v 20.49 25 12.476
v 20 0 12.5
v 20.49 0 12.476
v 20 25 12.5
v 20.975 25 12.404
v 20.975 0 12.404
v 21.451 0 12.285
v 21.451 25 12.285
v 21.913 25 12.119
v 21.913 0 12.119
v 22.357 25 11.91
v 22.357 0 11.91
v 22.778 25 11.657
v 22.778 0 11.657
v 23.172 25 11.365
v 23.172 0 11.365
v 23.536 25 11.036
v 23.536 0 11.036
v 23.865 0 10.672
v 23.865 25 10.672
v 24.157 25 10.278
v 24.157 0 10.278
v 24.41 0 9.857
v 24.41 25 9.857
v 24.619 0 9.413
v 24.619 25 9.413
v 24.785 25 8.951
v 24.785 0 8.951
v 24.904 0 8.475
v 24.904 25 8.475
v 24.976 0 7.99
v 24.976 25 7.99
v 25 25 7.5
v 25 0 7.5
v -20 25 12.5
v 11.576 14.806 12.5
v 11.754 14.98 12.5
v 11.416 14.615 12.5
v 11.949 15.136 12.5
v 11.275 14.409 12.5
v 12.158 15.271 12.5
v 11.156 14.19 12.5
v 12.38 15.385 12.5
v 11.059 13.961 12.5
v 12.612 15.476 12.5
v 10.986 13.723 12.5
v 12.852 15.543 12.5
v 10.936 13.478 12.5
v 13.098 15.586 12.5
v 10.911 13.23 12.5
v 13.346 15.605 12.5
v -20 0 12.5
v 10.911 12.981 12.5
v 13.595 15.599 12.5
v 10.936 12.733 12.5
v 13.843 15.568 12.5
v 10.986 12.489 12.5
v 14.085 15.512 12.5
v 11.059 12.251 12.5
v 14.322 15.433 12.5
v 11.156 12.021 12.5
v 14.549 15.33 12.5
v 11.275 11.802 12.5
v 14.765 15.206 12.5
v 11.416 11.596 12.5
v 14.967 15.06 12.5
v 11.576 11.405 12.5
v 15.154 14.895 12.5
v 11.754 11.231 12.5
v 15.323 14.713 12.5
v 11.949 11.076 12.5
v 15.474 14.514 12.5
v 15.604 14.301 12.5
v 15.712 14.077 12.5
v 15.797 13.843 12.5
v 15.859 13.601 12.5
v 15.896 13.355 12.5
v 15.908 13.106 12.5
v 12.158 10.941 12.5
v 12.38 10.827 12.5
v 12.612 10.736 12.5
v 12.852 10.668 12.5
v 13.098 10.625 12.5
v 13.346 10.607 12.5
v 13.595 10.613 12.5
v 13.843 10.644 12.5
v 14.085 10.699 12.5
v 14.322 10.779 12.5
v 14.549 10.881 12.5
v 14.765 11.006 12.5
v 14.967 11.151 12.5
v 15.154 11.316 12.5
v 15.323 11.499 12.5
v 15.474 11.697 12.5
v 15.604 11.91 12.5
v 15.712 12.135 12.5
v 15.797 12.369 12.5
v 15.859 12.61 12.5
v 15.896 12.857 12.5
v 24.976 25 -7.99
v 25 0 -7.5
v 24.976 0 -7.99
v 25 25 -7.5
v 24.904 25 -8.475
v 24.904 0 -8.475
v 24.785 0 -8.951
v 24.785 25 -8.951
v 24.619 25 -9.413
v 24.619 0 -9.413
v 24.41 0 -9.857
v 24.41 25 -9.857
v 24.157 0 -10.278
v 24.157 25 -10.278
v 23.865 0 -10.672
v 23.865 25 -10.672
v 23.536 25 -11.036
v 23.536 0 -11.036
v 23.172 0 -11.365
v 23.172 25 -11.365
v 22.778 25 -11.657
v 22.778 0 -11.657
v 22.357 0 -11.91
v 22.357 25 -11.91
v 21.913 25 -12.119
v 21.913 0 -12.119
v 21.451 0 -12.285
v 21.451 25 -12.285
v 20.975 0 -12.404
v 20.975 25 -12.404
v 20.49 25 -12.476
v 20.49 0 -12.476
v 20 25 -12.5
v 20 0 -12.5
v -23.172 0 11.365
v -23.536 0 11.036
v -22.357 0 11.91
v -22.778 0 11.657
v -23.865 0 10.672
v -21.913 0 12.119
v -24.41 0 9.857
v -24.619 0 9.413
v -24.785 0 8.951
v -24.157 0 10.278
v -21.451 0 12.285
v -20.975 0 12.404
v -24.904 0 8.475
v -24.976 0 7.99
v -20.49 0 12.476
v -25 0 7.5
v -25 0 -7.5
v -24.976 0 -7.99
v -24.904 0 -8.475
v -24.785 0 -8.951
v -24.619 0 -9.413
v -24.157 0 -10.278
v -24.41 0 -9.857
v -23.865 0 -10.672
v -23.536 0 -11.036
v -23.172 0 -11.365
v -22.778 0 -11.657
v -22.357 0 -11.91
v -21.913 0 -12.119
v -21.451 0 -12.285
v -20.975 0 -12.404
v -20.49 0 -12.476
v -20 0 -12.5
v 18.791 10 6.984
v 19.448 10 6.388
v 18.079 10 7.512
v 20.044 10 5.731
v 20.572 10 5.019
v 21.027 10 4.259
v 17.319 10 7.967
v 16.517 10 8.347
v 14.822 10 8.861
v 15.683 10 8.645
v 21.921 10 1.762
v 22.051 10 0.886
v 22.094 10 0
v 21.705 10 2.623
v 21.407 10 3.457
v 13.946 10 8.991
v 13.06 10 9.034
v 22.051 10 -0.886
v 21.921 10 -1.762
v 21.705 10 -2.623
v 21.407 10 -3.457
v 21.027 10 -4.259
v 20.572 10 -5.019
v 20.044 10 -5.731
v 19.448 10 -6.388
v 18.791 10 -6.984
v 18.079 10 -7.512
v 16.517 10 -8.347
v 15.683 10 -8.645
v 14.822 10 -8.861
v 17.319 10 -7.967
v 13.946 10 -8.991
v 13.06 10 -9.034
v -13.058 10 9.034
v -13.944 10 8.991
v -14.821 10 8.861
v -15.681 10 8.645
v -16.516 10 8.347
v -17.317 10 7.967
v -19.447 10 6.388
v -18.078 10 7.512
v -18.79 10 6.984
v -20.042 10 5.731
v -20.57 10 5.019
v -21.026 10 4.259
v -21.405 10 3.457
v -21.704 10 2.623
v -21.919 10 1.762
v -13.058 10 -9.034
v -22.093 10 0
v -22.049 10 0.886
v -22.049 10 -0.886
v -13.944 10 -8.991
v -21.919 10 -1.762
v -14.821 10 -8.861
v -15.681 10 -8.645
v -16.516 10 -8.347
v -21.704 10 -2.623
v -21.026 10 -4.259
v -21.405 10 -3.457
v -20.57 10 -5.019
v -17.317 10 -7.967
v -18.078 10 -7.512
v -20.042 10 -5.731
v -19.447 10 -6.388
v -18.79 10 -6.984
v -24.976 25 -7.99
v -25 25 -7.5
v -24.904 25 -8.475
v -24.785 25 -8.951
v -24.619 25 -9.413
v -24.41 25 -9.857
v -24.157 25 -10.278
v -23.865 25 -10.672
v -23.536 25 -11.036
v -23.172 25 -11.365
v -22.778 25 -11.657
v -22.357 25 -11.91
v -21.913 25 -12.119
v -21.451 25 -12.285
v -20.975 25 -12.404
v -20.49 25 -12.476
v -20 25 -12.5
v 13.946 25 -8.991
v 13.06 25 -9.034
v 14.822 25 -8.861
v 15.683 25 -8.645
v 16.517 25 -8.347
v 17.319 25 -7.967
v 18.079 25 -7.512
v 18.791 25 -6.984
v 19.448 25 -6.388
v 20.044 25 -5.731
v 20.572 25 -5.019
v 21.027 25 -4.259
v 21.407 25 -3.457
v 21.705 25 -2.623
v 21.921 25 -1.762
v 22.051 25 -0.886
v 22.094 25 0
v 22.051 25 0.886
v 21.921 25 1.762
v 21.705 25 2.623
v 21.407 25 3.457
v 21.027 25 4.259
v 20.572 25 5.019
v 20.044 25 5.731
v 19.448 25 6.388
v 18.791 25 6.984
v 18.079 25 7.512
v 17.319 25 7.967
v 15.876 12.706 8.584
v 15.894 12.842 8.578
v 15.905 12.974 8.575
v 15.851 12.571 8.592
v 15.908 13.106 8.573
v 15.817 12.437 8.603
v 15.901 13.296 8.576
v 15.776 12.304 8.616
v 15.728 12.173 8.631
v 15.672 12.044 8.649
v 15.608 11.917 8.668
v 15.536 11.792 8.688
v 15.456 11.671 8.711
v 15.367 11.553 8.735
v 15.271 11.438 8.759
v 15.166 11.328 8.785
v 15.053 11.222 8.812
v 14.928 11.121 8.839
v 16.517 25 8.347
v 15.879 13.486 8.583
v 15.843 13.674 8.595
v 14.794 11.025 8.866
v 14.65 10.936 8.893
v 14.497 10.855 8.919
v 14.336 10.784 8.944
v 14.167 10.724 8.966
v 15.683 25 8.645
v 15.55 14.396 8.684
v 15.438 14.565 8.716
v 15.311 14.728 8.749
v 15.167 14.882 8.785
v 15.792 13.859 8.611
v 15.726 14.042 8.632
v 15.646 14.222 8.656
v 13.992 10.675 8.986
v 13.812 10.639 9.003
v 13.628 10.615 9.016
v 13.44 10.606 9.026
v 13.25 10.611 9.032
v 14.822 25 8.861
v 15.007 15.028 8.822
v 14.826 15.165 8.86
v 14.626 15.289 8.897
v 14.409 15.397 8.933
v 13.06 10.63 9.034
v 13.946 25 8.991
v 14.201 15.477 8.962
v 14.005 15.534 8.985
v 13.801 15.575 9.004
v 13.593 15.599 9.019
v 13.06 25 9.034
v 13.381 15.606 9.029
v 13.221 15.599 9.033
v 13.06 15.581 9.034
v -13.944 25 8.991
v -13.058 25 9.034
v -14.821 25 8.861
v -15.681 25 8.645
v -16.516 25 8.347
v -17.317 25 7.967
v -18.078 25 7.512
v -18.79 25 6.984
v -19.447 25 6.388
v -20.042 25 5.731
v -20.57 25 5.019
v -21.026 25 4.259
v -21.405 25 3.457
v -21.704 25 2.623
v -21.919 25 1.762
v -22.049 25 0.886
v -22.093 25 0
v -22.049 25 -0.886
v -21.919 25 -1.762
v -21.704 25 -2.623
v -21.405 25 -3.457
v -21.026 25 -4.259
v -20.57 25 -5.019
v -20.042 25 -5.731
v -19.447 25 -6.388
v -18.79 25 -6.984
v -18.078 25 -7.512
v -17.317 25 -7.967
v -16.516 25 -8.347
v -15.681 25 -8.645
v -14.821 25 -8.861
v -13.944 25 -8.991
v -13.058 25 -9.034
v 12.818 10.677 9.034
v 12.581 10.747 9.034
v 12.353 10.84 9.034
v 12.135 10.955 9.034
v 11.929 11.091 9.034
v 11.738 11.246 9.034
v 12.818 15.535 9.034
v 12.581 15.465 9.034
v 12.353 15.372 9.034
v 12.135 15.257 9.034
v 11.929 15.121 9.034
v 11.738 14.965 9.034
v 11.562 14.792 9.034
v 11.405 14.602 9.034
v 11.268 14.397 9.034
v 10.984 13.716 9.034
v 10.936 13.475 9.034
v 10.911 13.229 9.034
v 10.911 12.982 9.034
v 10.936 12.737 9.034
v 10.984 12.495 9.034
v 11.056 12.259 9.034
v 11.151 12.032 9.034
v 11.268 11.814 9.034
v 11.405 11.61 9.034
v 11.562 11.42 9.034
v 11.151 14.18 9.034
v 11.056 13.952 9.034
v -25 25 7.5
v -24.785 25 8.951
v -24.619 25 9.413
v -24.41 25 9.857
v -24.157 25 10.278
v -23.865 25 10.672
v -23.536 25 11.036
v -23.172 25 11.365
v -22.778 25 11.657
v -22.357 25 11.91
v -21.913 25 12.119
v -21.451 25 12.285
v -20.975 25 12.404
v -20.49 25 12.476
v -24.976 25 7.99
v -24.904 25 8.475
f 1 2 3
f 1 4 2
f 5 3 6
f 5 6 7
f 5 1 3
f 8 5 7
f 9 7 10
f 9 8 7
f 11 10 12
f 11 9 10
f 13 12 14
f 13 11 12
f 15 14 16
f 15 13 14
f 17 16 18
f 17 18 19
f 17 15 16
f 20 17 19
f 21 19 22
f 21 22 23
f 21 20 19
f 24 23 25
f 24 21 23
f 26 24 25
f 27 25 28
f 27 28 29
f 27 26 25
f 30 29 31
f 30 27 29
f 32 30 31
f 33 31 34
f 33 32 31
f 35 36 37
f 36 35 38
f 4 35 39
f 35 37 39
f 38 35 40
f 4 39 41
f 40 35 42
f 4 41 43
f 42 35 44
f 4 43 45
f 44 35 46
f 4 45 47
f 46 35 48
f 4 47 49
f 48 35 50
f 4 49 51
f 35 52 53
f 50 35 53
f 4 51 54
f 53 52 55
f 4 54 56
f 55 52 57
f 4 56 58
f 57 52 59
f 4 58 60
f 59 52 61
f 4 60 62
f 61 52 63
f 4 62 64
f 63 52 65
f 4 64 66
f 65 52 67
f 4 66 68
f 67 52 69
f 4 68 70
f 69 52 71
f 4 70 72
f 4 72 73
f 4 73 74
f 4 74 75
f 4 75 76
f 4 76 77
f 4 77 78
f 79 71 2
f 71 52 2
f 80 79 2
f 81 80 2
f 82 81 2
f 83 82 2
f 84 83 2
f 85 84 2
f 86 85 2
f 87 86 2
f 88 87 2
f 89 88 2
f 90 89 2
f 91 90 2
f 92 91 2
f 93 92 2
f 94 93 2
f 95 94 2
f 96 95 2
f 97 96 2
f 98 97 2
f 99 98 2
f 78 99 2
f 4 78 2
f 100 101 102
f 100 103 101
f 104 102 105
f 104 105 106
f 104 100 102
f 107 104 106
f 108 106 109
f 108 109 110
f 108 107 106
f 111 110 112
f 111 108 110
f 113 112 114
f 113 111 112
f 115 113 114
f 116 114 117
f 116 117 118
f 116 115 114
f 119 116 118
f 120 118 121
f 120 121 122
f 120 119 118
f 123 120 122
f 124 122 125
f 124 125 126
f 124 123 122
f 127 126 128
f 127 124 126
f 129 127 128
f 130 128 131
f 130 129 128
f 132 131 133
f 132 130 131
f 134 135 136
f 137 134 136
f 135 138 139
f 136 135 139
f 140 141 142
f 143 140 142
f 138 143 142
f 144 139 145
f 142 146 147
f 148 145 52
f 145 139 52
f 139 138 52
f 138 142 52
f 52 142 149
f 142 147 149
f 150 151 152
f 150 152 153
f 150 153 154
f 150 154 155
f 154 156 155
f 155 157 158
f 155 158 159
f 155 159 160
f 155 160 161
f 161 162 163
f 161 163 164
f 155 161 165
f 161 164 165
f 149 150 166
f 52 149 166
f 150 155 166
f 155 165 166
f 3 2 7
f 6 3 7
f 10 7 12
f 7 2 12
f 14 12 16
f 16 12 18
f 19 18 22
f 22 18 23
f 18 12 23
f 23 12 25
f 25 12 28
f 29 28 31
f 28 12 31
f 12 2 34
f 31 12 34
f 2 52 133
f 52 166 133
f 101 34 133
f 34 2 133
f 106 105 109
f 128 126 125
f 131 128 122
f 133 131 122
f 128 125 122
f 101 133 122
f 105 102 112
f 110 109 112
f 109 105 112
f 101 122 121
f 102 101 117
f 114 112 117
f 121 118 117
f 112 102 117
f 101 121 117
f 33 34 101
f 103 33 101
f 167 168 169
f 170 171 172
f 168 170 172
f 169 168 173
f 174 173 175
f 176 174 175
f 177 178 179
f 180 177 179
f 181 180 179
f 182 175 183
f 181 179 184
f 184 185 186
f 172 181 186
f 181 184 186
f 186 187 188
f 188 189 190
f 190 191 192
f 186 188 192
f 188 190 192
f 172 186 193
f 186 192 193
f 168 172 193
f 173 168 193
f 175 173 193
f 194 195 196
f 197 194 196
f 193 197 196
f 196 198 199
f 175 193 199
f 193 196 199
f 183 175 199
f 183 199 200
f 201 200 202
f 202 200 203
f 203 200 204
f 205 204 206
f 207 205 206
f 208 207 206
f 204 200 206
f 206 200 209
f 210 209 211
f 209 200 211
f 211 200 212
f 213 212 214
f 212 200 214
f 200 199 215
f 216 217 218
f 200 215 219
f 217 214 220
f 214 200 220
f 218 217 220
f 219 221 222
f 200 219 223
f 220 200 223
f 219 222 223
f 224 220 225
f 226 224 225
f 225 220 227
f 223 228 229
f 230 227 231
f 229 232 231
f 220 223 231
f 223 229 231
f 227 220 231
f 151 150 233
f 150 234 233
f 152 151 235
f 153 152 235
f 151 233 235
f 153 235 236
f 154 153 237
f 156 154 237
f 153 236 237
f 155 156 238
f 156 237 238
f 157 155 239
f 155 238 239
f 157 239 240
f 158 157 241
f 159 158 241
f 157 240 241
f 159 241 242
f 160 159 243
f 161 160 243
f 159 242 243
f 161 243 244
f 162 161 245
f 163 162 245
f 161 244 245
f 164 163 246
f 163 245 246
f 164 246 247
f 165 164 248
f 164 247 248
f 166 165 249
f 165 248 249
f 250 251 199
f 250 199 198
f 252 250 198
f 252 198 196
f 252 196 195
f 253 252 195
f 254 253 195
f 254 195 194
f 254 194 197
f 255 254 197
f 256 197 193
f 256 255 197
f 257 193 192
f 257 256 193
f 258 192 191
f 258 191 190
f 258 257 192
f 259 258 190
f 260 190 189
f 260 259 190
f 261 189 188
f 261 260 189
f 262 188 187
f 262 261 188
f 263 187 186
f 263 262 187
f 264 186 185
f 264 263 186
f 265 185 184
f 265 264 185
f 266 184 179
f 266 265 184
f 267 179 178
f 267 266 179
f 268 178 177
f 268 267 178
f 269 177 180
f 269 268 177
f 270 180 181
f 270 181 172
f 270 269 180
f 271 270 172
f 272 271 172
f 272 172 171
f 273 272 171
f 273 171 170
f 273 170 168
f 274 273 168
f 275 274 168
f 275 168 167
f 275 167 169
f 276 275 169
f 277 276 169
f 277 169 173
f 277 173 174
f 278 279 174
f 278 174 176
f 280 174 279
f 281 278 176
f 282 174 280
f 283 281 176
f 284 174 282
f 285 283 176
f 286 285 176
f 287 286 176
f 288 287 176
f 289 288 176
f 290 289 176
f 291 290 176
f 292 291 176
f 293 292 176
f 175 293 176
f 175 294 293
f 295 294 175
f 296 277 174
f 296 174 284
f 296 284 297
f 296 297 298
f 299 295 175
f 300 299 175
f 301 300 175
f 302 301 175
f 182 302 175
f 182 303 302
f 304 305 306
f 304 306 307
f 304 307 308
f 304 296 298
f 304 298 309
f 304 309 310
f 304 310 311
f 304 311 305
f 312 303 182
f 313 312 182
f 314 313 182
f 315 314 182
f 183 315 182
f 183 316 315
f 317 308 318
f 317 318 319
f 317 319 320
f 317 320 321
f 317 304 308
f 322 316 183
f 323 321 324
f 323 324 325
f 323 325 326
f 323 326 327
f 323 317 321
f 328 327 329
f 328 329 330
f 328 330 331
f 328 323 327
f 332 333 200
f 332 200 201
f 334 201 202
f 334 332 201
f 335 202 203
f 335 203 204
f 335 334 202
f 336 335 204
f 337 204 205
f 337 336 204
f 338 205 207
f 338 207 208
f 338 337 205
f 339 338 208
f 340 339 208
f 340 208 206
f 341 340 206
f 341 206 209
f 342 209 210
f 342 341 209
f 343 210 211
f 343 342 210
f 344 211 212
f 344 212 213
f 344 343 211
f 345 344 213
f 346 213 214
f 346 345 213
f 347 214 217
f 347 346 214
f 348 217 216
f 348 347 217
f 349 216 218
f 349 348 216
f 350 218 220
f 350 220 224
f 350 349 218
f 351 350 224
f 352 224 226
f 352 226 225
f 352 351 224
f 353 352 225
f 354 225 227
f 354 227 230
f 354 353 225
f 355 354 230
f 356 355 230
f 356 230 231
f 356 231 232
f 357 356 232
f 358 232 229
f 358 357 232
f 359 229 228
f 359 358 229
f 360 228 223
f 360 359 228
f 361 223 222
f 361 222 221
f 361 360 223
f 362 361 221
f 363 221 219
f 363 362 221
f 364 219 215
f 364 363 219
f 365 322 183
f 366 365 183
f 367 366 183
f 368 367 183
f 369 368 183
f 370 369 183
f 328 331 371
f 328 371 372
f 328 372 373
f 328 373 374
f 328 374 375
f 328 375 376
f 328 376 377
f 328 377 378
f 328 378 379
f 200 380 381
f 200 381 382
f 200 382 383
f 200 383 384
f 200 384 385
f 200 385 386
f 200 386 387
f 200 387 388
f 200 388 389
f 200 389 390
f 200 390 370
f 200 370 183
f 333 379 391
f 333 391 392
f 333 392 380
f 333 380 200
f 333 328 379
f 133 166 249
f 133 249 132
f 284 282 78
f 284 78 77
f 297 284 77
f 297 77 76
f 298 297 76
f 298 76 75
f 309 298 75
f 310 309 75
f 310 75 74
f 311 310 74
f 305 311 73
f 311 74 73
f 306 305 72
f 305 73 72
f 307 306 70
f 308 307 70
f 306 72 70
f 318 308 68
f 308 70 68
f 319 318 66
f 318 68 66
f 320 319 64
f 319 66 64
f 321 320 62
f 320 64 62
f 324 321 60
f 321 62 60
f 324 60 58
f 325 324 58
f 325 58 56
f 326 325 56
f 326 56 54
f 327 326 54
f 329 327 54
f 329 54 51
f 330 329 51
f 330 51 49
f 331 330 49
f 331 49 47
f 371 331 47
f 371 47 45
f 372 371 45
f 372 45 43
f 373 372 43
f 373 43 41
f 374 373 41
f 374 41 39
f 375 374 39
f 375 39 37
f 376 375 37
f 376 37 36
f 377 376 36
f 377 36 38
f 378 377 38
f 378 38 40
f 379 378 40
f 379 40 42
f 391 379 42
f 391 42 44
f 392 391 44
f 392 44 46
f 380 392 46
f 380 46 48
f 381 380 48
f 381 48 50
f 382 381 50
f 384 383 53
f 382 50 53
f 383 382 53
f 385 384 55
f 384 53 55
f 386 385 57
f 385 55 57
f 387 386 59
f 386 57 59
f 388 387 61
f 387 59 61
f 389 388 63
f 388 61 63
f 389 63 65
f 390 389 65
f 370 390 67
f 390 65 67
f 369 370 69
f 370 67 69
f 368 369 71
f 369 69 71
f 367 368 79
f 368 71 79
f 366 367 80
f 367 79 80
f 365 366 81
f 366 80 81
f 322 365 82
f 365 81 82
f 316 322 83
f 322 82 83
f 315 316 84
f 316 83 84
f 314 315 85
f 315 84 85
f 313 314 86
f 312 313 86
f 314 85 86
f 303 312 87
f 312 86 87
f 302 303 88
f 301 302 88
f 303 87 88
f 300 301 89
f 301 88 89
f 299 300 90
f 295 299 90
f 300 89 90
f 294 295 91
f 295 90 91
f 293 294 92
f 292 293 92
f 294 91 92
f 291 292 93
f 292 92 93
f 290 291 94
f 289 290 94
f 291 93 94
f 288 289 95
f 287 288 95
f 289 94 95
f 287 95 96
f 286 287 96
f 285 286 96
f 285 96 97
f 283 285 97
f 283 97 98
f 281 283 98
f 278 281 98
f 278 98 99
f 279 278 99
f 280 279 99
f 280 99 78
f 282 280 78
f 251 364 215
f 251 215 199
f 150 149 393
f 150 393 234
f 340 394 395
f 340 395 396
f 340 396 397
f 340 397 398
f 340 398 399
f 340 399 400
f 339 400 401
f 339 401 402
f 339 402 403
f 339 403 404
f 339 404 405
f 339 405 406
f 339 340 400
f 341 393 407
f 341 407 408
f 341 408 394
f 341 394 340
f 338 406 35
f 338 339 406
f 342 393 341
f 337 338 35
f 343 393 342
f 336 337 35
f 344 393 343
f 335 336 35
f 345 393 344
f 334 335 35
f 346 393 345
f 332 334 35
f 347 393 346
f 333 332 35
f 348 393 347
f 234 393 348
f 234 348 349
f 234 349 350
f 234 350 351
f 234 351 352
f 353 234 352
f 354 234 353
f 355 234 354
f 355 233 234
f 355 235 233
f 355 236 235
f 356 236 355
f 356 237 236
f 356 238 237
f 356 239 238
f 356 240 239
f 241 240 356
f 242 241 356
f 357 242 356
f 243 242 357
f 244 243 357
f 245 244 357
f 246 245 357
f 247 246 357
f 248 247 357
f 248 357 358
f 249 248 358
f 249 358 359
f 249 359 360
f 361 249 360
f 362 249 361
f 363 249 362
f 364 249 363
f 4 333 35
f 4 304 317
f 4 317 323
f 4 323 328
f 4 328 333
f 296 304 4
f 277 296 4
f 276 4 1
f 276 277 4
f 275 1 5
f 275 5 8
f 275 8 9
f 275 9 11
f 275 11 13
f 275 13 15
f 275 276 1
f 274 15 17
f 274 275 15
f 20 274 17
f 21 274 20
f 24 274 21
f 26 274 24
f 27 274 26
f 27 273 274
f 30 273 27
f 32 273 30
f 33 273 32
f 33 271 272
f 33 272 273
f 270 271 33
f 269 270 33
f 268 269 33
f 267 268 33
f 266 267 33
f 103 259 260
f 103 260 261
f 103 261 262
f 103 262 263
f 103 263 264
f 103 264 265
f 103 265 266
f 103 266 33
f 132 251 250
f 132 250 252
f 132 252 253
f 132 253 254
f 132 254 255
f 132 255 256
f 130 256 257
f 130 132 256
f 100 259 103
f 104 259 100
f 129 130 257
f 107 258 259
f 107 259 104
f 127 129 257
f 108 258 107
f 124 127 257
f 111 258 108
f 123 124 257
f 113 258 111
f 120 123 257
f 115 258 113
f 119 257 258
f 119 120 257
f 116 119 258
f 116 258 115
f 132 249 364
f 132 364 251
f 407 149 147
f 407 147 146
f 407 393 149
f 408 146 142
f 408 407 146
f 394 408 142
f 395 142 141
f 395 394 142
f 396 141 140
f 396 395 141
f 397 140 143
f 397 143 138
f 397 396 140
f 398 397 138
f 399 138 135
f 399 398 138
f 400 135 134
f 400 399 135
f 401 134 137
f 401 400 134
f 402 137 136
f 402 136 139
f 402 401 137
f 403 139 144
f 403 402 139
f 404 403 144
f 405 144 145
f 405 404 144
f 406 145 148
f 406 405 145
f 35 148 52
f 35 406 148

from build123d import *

# Parameters (mm, degrees)
SKETCH1_W           = 50
SKETCH1_H           = 25
BOSS_EXTRUDE1_DEPTH = 25
FILLET2_R           = 5
CUT_EXTRUDE1_DEPTH  = 15
SKETCH3_R           = 2.5
CUT_EXTRUDE2_DEPTH  = 10


with BuildPart() as part:
    # Sketch1 → Boss-Extrude1 (new body)
    with BuildSketch(Plane(origin=(0, 0, 0), x_dir=(1, 0, 0), z_dir=(0, 1, 0))):
        Rectangle(SKETCH1_W, SKETCH1_H)
    extrude(amount=BOSS_EXTRUDE1_DEPTH)

    # Fillet2
    fillet2_edges = [part.edges().sort_by_distance(p)[0] for p in [
        (25, 12.5, 12.5),
        (-25, 12.5, 12.5),
        (-25, 12.5, -12.5),
        (25, 12.5, -12.5),
    ]]
    fillet(fillet2_edges, radius=FILLET2_R)

    # Sketch2 → Cut-Extrude1 (cut)
    with BuildSketch(Plane(origin=(0, 25, 0), x_dir=(1, 0, 0), z_dir=(0, 1, 0))):
        with BuildLine():
            Line((-13.058351702, 9.034247402), (13.06, 9.034247402))
            ThreePointArc((13.06, 9.034247402), (22.094247402, 0), (13.06, -9.034247402))
            Line((13.06, -9.034247402), (-13.058351702, -9.034247402))
            ThreePointArc((-13.058351702, -9.034247402), (-22.092599103, 0), (-13.058351702, 9.034247402))
        make_face()
    extrude(amount=-CUT_EXTRUDE1_DEPTH, mode=Mode.SUBTRACT)

    # Sketch3 → Cut-Extrude2 (cut)
    with BuildSketch(Plane.XY.offset(12.5)):
        with Locations((13.408381173, 13.105781034)):
            Circle(SKETCH3_R)
    extrude(amount=-CUT_EXTRUDE2_DEPTH, mode=Mode.SUBTRACT)


solid = part.part
